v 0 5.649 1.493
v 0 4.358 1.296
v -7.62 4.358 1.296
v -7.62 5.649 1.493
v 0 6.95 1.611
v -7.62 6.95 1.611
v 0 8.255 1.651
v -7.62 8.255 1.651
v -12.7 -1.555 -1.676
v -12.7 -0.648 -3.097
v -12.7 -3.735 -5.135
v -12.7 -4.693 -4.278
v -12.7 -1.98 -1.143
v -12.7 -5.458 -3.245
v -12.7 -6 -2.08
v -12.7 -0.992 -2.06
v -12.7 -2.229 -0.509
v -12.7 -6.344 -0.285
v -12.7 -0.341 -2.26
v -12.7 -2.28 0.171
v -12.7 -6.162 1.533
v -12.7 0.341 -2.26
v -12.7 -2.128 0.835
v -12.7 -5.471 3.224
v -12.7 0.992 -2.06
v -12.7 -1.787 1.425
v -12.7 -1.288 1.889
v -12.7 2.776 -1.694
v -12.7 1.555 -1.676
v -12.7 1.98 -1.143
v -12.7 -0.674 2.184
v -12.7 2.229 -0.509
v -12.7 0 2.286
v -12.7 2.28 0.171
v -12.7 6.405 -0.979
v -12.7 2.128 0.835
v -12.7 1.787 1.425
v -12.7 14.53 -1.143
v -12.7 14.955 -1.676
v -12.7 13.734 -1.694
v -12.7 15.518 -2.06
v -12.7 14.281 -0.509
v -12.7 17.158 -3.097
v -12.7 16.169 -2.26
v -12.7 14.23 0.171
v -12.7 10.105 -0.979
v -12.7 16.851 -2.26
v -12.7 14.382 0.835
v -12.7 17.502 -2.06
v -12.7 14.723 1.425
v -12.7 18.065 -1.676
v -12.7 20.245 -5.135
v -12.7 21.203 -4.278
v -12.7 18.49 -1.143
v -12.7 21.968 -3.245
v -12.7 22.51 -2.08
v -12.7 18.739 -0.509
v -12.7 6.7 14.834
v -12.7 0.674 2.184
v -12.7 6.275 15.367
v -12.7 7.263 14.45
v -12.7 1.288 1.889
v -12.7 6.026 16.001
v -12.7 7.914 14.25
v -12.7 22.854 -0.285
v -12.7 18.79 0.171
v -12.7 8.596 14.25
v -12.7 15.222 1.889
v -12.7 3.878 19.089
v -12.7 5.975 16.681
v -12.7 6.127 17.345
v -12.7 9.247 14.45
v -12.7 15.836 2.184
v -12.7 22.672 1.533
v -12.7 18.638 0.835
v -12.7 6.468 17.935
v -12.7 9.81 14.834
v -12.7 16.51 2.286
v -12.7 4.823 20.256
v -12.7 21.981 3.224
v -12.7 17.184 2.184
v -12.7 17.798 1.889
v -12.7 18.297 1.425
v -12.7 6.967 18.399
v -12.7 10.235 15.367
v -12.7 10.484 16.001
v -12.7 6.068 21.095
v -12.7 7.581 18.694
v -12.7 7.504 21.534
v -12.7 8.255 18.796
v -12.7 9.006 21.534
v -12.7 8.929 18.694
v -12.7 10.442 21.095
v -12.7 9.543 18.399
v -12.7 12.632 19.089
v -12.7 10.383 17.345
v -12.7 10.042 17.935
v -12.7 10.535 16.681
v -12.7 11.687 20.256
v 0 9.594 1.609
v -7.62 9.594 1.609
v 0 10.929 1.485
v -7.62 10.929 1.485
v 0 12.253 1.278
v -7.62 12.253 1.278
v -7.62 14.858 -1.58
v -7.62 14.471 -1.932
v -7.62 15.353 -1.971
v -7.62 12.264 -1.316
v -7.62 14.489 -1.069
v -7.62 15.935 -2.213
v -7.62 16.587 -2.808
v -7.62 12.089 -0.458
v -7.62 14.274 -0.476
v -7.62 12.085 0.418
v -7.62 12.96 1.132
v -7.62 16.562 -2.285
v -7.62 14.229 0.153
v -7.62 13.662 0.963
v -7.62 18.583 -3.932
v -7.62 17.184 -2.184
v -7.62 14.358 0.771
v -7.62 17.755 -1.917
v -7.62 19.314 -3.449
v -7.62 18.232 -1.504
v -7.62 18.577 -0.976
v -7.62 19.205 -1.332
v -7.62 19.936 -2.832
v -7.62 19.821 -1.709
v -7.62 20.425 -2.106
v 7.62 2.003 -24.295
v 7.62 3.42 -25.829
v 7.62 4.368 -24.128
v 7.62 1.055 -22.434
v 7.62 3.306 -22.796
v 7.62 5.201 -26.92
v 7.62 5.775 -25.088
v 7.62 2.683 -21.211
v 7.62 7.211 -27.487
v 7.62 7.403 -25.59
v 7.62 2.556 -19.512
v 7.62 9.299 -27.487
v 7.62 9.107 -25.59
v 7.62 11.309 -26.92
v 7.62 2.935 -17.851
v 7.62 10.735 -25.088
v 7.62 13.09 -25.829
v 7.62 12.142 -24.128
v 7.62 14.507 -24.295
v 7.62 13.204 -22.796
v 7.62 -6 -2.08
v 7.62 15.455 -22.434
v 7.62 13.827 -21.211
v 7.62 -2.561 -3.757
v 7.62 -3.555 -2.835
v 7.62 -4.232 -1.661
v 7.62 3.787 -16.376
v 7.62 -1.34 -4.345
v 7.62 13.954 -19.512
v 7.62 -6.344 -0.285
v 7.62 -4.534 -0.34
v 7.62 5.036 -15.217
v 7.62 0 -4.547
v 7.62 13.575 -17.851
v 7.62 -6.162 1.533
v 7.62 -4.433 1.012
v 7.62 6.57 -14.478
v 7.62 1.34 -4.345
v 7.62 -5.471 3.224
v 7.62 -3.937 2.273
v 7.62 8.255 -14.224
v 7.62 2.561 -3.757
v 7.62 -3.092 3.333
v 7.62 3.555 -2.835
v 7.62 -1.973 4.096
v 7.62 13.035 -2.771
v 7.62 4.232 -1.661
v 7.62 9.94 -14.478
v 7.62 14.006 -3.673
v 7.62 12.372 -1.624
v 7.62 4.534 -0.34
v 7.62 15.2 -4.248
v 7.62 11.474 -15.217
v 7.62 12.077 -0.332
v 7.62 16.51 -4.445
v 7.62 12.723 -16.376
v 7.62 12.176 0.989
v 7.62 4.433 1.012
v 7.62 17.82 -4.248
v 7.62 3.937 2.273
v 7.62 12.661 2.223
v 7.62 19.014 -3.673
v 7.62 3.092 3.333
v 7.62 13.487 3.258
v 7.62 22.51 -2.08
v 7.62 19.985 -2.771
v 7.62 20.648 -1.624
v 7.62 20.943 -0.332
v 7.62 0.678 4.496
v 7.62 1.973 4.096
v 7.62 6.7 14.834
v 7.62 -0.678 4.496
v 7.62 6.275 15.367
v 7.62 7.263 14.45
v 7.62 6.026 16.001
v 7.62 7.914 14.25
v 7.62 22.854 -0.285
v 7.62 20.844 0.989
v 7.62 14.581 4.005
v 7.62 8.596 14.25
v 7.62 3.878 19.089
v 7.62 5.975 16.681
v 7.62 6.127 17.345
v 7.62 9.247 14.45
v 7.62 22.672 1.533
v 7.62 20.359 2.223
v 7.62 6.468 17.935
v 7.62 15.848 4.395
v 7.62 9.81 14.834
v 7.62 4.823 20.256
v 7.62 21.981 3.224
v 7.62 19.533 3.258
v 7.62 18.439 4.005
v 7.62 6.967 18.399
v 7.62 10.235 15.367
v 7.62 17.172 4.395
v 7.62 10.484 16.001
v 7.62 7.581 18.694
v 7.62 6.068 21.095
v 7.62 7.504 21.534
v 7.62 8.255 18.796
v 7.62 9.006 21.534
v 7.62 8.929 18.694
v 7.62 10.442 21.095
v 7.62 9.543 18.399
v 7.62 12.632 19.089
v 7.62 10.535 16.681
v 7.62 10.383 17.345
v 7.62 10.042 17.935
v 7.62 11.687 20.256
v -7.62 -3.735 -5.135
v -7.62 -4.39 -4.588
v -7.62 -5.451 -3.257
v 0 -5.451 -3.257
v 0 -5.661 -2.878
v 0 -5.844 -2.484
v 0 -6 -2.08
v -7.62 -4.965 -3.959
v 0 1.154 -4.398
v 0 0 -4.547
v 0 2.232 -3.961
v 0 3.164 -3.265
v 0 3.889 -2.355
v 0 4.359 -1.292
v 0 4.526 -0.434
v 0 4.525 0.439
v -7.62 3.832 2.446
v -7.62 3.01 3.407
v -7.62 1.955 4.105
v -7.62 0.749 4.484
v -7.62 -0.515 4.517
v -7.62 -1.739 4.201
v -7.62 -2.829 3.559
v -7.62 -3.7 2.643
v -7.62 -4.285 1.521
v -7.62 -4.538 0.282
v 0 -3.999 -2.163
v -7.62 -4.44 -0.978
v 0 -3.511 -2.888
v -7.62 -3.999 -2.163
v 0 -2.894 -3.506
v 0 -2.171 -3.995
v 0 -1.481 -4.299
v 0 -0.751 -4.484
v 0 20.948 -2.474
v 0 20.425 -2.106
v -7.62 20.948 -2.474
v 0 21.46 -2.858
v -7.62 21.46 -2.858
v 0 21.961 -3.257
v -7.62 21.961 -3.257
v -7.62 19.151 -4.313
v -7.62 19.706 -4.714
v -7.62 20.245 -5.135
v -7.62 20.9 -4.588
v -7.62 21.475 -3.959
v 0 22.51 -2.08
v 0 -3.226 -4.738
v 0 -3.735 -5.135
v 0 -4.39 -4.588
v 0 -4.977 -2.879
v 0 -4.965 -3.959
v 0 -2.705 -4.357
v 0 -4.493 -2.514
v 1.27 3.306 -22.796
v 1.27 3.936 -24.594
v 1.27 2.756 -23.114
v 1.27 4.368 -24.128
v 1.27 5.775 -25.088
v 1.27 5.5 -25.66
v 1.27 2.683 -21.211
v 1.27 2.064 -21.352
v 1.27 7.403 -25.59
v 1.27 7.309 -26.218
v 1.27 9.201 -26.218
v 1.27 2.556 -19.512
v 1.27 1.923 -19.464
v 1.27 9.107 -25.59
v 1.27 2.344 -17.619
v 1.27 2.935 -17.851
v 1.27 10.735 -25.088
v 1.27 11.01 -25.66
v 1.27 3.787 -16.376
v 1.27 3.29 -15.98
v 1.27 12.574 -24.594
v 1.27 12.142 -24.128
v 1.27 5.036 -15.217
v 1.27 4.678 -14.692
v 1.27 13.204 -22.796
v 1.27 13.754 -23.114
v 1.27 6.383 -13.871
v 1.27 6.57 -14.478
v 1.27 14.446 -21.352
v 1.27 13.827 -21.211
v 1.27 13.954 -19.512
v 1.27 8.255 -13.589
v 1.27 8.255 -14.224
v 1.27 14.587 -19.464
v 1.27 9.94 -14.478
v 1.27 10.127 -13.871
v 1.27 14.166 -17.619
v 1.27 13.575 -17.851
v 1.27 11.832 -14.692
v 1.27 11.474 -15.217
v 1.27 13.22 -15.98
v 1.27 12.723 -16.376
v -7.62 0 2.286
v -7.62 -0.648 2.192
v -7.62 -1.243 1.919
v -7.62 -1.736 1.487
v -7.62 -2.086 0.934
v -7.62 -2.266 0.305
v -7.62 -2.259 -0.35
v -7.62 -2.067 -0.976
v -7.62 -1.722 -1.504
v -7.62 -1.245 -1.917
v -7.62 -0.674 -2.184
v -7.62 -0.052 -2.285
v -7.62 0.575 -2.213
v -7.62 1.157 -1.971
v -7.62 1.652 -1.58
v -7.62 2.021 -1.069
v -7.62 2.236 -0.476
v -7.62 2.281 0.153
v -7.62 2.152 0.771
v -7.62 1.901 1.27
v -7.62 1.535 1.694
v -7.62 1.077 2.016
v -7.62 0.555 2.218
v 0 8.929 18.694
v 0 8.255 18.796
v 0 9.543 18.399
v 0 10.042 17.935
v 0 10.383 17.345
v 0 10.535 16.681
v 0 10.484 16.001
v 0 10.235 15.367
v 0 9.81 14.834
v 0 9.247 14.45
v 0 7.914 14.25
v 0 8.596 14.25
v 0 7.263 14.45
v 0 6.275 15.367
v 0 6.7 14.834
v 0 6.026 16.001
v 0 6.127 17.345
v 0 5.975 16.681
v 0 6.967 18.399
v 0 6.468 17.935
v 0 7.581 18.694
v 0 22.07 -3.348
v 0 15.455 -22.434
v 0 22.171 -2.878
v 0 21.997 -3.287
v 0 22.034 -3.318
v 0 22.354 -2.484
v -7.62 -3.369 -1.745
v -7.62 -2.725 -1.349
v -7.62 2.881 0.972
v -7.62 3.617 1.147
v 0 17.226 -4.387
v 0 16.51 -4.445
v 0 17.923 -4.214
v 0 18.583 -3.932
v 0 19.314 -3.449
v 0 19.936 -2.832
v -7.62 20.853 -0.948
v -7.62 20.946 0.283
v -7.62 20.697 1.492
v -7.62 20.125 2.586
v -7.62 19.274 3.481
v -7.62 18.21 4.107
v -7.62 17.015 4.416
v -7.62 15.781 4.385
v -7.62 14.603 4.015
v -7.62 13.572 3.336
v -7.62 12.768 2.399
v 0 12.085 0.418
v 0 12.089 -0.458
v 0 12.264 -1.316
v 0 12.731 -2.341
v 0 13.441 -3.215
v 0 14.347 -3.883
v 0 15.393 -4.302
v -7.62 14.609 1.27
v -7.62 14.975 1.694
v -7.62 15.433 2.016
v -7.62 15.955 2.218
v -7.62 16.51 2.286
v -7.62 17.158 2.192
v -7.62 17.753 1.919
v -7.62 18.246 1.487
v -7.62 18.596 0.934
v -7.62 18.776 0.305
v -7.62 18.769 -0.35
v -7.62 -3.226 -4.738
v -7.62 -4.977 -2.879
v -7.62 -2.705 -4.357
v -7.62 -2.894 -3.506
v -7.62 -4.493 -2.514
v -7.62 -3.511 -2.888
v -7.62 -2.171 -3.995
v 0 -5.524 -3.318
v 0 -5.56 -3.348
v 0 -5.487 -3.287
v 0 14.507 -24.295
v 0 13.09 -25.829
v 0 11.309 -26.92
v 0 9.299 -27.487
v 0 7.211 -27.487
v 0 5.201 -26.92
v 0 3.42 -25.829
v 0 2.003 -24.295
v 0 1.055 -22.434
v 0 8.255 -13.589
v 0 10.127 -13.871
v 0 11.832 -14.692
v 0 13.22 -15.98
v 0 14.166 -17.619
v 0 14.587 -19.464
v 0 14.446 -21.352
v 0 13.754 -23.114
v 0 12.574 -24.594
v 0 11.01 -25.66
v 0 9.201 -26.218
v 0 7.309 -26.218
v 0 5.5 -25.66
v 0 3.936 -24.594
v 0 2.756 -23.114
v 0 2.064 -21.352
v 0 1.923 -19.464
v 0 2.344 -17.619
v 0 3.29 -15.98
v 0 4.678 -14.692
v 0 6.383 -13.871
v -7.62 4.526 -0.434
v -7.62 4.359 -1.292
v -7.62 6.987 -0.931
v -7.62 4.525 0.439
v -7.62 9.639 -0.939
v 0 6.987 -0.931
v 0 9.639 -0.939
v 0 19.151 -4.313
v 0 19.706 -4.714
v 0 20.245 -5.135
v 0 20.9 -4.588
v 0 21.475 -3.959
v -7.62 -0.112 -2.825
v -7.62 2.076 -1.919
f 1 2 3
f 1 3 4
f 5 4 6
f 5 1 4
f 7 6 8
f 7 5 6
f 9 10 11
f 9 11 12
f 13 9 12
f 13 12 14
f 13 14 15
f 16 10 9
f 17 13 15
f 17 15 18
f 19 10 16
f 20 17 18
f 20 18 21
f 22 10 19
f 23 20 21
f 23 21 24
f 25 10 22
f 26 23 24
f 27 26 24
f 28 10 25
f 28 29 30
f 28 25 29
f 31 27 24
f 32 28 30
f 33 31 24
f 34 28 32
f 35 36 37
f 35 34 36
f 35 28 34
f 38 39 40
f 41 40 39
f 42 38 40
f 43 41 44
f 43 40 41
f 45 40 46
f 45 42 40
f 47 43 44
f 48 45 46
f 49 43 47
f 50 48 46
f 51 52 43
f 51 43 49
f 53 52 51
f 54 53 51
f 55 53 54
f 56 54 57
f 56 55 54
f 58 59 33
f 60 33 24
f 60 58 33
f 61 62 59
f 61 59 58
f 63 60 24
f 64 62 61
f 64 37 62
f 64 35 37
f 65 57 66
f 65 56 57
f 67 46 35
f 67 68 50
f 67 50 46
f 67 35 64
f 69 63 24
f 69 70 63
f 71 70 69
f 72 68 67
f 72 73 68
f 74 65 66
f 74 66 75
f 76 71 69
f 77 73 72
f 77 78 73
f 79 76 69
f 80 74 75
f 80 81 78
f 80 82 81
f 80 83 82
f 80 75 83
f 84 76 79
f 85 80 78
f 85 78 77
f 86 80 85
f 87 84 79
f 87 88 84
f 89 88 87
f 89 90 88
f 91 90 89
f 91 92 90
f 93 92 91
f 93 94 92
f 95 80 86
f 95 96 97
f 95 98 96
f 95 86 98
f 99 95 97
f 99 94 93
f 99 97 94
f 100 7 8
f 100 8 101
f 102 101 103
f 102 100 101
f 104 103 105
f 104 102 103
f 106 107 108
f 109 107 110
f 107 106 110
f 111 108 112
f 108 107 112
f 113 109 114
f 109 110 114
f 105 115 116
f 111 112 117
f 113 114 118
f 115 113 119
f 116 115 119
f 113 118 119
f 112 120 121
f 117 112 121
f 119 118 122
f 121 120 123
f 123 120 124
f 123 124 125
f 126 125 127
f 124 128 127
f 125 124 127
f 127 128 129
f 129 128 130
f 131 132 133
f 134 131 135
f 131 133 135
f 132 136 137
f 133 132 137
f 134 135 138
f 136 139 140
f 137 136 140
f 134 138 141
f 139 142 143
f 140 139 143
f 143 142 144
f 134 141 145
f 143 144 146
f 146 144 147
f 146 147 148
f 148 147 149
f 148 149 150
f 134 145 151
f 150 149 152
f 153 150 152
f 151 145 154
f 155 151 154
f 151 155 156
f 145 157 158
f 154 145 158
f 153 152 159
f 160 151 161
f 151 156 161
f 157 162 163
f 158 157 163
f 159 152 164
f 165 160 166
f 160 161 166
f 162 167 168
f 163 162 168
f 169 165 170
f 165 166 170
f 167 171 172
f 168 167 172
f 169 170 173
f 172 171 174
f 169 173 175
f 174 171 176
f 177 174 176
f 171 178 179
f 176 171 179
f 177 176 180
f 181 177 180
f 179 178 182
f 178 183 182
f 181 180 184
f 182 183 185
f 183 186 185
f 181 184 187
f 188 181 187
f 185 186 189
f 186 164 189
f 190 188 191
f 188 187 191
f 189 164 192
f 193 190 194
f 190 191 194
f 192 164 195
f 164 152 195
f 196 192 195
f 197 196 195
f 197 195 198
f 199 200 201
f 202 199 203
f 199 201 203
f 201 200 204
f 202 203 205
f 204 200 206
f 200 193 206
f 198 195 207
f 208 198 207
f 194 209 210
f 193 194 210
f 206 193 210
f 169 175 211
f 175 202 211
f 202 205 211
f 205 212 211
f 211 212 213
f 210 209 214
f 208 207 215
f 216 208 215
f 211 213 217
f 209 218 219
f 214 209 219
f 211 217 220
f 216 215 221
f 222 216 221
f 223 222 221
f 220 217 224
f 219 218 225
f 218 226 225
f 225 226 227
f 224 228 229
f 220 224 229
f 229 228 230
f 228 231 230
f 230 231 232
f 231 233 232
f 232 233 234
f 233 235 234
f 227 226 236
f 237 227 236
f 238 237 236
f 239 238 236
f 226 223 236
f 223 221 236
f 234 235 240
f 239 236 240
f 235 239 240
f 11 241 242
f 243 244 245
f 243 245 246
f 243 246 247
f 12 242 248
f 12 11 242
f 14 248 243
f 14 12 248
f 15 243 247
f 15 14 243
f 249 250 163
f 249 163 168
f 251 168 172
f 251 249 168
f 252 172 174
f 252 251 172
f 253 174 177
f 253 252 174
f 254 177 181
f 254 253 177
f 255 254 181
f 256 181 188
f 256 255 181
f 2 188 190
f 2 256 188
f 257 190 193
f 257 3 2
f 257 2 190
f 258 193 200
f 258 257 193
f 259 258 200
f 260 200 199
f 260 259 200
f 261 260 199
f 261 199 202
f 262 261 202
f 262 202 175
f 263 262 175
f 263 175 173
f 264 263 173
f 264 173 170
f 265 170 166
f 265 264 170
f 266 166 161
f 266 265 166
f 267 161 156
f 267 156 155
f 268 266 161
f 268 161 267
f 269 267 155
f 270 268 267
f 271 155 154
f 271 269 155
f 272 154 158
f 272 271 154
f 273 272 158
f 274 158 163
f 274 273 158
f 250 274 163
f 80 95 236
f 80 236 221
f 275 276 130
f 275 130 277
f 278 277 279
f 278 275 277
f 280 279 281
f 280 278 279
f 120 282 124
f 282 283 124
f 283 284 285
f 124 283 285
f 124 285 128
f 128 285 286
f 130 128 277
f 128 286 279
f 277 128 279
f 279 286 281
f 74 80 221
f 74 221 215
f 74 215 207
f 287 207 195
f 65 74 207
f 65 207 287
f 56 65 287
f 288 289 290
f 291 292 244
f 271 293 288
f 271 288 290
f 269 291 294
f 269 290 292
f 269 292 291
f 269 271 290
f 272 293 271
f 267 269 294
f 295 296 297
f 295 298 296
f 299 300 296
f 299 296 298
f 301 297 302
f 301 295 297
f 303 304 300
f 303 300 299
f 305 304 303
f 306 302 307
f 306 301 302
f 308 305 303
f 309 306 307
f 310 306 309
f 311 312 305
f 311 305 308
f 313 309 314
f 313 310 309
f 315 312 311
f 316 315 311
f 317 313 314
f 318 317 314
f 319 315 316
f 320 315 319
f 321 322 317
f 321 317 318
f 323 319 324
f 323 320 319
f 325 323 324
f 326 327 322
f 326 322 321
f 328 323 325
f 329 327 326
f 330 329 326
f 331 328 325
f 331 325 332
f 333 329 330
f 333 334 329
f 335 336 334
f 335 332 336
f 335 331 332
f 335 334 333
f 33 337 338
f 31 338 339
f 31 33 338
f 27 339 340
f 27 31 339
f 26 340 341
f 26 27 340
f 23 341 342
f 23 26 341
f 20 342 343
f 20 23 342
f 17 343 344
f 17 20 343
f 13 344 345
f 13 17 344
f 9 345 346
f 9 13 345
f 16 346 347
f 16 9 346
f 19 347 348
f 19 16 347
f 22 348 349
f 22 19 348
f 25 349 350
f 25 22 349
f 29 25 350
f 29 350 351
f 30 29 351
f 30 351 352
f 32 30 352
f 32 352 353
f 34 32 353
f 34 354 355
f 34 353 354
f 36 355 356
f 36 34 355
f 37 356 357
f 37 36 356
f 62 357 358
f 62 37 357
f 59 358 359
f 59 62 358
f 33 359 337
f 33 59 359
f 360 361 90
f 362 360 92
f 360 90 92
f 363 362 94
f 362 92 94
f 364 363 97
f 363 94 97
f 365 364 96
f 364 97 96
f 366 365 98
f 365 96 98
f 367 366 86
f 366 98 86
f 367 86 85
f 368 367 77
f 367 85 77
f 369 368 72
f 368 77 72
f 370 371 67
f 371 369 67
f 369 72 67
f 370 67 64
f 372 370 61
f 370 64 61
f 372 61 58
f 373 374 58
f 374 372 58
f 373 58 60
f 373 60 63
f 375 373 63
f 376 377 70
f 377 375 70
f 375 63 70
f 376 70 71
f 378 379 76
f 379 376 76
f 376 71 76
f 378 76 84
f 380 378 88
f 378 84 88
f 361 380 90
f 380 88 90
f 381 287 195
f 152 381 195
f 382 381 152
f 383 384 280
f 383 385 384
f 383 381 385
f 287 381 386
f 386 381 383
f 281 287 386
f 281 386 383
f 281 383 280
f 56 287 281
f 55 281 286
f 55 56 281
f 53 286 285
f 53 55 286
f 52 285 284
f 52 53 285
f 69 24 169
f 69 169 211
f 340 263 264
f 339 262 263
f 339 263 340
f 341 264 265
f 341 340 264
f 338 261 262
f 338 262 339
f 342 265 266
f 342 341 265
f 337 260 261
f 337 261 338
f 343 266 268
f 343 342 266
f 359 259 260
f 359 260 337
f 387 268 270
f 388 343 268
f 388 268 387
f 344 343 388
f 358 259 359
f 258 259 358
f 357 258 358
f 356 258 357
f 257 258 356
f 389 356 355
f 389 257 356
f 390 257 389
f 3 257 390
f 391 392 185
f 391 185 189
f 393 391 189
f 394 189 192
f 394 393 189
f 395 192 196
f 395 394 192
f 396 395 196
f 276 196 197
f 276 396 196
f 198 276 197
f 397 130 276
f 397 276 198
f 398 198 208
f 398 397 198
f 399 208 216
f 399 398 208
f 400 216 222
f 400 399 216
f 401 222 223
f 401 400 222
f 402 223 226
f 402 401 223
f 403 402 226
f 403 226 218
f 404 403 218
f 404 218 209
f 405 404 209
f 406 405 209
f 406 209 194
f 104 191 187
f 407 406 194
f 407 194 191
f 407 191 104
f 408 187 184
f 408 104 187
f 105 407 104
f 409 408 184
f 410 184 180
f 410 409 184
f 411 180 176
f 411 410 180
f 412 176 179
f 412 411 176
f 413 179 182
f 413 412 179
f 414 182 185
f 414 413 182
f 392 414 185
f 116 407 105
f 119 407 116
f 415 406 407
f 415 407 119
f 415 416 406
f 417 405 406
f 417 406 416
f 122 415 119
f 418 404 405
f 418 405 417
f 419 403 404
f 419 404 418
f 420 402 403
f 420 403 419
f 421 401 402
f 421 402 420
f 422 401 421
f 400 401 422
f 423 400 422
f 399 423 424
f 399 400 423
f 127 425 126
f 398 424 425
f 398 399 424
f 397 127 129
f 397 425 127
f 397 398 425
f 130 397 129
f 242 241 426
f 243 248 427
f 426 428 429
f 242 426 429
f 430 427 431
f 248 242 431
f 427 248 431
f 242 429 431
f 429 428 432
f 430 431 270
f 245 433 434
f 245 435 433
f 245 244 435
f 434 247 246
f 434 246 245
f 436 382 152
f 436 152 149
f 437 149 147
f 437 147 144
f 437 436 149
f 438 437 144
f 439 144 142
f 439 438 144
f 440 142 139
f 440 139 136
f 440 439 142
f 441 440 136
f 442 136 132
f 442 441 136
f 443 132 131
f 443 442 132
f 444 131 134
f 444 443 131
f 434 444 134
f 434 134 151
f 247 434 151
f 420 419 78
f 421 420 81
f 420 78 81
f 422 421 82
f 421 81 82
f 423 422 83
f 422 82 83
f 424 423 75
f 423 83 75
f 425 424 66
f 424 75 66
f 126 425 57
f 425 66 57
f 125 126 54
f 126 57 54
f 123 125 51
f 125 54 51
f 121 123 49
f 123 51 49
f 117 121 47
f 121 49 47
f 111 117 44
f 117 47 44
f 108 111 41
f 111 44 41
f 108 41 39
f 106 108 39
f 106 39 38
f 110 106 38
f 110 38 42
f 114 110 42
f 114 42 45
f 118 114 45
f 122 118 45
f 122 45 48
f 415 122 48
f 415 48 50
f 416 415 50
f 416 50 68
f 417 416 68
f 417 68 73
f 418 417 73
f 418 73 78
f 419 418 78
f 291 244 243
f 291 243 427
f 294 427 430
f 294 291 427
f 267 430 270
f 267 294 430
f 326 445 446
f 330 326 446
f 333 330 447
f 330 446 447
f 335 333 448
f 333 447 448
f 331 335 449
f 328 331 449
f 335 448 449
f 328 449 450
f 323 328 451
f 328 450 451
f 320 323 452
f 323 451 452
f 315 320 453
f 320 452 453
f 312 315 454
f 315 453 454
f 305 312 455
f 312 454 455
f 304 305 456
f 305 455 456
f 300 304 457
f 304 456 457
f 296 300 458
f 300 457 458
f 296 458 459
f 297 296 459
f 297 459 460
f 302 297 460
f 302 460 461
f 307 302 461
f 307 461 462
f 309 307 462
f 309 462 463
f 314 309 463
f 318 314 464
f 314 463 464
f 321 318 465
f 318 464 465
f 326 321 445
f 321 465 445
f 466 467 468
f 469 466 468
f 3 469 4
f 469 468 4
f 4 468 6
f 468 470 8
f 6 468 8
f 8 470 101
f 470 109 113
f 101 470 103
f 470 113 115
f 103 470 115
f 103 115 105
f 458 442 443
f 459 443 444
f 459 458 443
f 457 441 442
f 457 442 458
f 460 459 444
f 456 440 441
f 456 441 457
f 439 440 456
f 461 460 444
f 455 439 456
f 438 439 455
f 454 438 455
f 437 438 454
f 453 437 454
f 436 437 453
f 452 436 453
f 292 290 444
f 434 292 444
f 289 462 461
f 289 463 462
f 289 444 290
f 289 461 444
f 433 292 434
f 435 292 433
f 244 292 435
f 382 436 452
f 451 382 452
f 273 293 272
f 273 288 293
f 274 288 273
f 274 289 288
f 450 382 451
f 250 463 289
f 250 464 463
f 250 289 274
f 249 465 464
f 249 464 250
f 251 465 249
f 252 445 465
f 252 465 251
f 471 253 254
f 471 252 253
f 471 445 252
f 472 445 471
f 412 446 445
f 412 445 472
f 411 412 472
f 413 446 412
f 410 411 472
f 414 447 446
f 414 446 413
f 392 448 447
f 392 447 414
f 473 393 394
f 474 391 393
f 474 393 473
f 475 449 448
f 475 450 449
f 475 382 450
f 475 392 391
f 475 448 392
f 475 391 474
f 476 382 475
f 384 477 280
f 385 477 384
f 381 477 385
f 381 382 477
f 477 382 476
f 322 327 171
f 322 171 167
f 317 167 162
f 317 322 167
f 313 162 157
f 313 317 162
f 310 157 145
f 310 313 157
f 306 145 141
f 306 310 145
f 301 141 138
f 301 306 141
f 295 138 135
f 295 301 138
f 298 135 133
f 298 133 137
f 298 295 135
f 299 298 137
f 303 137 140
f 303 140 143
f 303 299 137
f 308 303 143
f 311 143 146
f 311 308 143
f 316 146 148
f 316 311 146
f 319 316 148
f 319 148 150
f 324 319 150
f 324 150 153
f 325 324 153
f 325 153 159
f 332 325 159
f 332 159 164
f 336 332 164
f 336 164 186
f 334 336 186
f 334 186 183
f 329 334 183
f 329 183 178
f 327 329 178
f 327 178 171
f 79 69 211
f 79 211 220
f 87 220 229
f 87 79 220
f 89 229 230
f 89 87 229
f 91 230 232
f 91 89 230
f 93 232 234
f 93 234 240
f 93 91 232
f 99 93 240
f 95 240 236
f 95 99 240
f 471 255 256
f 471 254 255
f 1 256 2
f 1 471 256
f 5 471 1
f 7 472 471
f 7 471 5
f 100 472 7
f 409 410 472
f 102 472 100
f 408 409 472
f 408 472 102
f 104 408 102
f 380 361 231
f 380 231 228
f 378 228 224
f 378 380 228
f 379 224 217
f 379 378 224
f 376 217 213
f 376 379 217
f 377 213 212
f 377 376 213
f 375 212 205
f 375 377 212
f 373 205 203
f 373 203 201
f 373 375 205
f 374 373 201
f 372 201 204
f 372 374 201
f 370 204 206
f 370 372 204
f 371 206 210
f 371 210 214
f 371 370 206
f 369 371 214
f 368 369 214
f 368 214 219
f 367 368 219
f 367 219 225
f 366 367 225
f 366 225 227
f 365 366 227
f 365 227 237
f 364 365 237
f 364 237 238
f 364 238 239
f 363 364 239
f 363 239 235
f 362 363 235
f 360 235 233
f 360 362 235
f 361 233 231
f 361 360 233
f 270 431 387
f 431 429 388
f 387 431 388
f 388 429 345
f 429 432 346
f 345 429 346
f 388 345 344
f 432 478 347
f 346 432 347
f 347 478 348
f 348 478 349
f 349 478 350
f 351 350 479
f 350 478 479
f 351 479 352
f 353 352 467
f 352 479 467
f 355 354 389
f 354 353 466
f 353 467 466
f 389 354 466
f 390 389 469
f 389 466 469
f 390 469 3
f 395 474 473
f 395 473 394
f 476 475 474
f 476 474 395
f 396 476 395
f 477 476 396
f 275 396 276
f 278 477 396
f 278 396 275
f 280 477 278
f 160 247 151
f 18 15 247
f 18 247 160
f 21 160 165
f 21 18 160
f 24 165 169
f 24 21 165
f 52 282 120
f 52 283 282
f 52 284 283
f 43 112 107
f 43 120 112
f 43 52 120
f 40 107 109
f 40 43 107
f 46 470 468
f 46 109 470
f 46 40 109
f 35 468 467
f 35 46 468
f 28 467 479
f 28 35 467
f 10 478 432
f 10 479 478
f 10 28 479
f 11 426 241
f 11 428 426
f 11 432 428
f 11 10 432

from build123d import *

# Parameters (mm, degrees)
SKETCH1_R           = 5.715
SKETCH1_R_2         = 2.286
BOSS_EXTRUDE1_DEPTH = 7.62
BOSS_EXTRUDE2_START = 12.7
SKETCH2_R           = 2.286
BOSS_EXTRUDE2_DEPTH = 12.7
SKETCH3_R           = 6.35
CUT_EXTRUDE1_DEPTH  = 1.27
SKETCH5_R           = 21.59
CUT_EXTRUDE3_DEPTH  = 7.62
CUT_EXTRUDE2_START  = -15.24
SKETCH4_R           = 4.5466
SKETCH4_R_2         = 4.445
CUT_EXTRUDE2_DEPTH  = 15.24


with BuildPart() as part:
    # Sketch1 → Boss-Extrude1 (new body)
    with BuildSketch(Plane(origin=(0, 0, 0), x_dir=(0, 0, -1), z_dir=(1, 0, 0))):
        with BuildLine():
            Line((2.079548127, 22.50983163), (22.434457752, 15.454797956))
            ThreePointArc((22.434457752, 15.454797956), (27.559, 8.255), (22.434457752, 1.055202044))
            Line((22.434457752, 1.055202044), (2.079548127, -5.99983163))
            ThreePointArc((2.079548127, -5.99983163), (-0.630342168, -6.318636621), (-3.223846154, -5.470769231))
            Line((-3.223846154, -5.470769231), (-19.089076923, 3.878384615))
            ThreePointArc((-19.089076923, 3.878384615), (-21.59, 8.255), (-19.089076923, 12.631615385))
            Line((-19.089076923, 12.631615385), (-3.223846154, 21.980769231))
            ThreePointArc((-3.223846154, 21.980769231), (-0.630342168, 22.828636621), (2.079548127, 22.50983163))
        make_face()
        with Locations(Location((19.939, 8.255, 0), (0, 0, 180))):
            Circle(SKETCH1_R, mode=Mode.SUBTRACT)
        with Locations(Location((0, 16.51, 0), (0, 0, 180))):
            Circle(SKETCH1_R_2, mode=Mode.SUBTRACT)
        with Locations(Location((0, 0, 0), (0, 0, 180))):
            Circle(SKETCH1_R_2, mode=Mode.SUBTRACT)
        with Locations(Location((-16.51, 8.255, 0), (0, 0, 180))):
            Circle(SKETCH1_R_2, mode=Mode.SUBTRACT)
    extrude(amount=BOSS_EXTRUDE1_DEPTH)

    # Sketch2 → Boss-Extrude2 (add)
    with BuildSketch(Plane.ZY.offset(BOSS_EXTRUDE2_START)):
        with BuildLine():
            Line((19.089076923, 12.631615385), (3.223846154, 21.980769231))
            ThreePointArc((3.223846154, 21.980769231), (0.630342168, 22.828636621), (-2.079548127, 22.50983163))
            ThreePointArc((-2.079548127, 22.50983163), (-3.781080863, 21.611561281), (-5.1354637, 20.244904629))
            ThreePointArc((-5.1354637, 20.244904629), (-0.889, 8.255), (-5.1354637, -3.734904629))
            ThreePointArc((-5.1354637, -3.734904629), (-3.781080863, -5.101561281), (-2.079548127, -5.99983163))
            ThreePointArc((-2.079548127, -5.99983163), (0.630342168, -6.318636621), (3.223846154, -5.470769231))
            Line((3.223846154, -5.470769231), (19.089076923, 3.878384615))
            ThreePointArc((19.089076923, 3.878384615), (21.59, 8.255), (19.089076923, 12.631615385))
        make_face()
        Circle(SKETCH2_R, mode=Mode.SUBTRACT)
        with Locations((0, 16.51)):
            Circle(SKETCH2_R, mode=Mode.SUBTRACT)
        with Locations((16.51, 8.255)):
            Circle(SKETCH2_R, mode=Mode.SUBTRACT)
    extrude(amount=-BOSS_EXTRUDE2_DEPTH)

    # Sketch3 → Cut-Extrude1 (cut)
    with BuildSketch(Plane.ZY):
        with Locations((-19.939, 8.255)):
            Circle(SKETCH3_R)
    extrude(amount=-CUT_EXTRUDE1_DEPTH, mode=Mode.SUBTRACT)

    # Sketch5 → Cut-Extrude3 (cut)
    with BuildSketch(Plane.ZY):
        with Locations((-19.939, 8.255)):
            Circle(SKETCH5_R)
    extrude(amount=CUT_EXTRUDE3_DEPTH, mode=Mode.SUBTRACT)

    # Sketch4 → Cut-Extrude2 (cut)
    with BuildSketch(Plane(origin=(7.62, 0, 0), x_dir=(0, 0, -1), z_dir=(1, 0, 0)).offset(CUT_EXTRUDE2_START)):
        Circle(SKETCH4_R)
        with Locations((0, 16.51)):
            Circle(SKETCH4_R_2)
    extrude(amount=CUT_EXTRUDE2_DEPTH, mode=Mode.SUBTRACT)


solid = part.part
